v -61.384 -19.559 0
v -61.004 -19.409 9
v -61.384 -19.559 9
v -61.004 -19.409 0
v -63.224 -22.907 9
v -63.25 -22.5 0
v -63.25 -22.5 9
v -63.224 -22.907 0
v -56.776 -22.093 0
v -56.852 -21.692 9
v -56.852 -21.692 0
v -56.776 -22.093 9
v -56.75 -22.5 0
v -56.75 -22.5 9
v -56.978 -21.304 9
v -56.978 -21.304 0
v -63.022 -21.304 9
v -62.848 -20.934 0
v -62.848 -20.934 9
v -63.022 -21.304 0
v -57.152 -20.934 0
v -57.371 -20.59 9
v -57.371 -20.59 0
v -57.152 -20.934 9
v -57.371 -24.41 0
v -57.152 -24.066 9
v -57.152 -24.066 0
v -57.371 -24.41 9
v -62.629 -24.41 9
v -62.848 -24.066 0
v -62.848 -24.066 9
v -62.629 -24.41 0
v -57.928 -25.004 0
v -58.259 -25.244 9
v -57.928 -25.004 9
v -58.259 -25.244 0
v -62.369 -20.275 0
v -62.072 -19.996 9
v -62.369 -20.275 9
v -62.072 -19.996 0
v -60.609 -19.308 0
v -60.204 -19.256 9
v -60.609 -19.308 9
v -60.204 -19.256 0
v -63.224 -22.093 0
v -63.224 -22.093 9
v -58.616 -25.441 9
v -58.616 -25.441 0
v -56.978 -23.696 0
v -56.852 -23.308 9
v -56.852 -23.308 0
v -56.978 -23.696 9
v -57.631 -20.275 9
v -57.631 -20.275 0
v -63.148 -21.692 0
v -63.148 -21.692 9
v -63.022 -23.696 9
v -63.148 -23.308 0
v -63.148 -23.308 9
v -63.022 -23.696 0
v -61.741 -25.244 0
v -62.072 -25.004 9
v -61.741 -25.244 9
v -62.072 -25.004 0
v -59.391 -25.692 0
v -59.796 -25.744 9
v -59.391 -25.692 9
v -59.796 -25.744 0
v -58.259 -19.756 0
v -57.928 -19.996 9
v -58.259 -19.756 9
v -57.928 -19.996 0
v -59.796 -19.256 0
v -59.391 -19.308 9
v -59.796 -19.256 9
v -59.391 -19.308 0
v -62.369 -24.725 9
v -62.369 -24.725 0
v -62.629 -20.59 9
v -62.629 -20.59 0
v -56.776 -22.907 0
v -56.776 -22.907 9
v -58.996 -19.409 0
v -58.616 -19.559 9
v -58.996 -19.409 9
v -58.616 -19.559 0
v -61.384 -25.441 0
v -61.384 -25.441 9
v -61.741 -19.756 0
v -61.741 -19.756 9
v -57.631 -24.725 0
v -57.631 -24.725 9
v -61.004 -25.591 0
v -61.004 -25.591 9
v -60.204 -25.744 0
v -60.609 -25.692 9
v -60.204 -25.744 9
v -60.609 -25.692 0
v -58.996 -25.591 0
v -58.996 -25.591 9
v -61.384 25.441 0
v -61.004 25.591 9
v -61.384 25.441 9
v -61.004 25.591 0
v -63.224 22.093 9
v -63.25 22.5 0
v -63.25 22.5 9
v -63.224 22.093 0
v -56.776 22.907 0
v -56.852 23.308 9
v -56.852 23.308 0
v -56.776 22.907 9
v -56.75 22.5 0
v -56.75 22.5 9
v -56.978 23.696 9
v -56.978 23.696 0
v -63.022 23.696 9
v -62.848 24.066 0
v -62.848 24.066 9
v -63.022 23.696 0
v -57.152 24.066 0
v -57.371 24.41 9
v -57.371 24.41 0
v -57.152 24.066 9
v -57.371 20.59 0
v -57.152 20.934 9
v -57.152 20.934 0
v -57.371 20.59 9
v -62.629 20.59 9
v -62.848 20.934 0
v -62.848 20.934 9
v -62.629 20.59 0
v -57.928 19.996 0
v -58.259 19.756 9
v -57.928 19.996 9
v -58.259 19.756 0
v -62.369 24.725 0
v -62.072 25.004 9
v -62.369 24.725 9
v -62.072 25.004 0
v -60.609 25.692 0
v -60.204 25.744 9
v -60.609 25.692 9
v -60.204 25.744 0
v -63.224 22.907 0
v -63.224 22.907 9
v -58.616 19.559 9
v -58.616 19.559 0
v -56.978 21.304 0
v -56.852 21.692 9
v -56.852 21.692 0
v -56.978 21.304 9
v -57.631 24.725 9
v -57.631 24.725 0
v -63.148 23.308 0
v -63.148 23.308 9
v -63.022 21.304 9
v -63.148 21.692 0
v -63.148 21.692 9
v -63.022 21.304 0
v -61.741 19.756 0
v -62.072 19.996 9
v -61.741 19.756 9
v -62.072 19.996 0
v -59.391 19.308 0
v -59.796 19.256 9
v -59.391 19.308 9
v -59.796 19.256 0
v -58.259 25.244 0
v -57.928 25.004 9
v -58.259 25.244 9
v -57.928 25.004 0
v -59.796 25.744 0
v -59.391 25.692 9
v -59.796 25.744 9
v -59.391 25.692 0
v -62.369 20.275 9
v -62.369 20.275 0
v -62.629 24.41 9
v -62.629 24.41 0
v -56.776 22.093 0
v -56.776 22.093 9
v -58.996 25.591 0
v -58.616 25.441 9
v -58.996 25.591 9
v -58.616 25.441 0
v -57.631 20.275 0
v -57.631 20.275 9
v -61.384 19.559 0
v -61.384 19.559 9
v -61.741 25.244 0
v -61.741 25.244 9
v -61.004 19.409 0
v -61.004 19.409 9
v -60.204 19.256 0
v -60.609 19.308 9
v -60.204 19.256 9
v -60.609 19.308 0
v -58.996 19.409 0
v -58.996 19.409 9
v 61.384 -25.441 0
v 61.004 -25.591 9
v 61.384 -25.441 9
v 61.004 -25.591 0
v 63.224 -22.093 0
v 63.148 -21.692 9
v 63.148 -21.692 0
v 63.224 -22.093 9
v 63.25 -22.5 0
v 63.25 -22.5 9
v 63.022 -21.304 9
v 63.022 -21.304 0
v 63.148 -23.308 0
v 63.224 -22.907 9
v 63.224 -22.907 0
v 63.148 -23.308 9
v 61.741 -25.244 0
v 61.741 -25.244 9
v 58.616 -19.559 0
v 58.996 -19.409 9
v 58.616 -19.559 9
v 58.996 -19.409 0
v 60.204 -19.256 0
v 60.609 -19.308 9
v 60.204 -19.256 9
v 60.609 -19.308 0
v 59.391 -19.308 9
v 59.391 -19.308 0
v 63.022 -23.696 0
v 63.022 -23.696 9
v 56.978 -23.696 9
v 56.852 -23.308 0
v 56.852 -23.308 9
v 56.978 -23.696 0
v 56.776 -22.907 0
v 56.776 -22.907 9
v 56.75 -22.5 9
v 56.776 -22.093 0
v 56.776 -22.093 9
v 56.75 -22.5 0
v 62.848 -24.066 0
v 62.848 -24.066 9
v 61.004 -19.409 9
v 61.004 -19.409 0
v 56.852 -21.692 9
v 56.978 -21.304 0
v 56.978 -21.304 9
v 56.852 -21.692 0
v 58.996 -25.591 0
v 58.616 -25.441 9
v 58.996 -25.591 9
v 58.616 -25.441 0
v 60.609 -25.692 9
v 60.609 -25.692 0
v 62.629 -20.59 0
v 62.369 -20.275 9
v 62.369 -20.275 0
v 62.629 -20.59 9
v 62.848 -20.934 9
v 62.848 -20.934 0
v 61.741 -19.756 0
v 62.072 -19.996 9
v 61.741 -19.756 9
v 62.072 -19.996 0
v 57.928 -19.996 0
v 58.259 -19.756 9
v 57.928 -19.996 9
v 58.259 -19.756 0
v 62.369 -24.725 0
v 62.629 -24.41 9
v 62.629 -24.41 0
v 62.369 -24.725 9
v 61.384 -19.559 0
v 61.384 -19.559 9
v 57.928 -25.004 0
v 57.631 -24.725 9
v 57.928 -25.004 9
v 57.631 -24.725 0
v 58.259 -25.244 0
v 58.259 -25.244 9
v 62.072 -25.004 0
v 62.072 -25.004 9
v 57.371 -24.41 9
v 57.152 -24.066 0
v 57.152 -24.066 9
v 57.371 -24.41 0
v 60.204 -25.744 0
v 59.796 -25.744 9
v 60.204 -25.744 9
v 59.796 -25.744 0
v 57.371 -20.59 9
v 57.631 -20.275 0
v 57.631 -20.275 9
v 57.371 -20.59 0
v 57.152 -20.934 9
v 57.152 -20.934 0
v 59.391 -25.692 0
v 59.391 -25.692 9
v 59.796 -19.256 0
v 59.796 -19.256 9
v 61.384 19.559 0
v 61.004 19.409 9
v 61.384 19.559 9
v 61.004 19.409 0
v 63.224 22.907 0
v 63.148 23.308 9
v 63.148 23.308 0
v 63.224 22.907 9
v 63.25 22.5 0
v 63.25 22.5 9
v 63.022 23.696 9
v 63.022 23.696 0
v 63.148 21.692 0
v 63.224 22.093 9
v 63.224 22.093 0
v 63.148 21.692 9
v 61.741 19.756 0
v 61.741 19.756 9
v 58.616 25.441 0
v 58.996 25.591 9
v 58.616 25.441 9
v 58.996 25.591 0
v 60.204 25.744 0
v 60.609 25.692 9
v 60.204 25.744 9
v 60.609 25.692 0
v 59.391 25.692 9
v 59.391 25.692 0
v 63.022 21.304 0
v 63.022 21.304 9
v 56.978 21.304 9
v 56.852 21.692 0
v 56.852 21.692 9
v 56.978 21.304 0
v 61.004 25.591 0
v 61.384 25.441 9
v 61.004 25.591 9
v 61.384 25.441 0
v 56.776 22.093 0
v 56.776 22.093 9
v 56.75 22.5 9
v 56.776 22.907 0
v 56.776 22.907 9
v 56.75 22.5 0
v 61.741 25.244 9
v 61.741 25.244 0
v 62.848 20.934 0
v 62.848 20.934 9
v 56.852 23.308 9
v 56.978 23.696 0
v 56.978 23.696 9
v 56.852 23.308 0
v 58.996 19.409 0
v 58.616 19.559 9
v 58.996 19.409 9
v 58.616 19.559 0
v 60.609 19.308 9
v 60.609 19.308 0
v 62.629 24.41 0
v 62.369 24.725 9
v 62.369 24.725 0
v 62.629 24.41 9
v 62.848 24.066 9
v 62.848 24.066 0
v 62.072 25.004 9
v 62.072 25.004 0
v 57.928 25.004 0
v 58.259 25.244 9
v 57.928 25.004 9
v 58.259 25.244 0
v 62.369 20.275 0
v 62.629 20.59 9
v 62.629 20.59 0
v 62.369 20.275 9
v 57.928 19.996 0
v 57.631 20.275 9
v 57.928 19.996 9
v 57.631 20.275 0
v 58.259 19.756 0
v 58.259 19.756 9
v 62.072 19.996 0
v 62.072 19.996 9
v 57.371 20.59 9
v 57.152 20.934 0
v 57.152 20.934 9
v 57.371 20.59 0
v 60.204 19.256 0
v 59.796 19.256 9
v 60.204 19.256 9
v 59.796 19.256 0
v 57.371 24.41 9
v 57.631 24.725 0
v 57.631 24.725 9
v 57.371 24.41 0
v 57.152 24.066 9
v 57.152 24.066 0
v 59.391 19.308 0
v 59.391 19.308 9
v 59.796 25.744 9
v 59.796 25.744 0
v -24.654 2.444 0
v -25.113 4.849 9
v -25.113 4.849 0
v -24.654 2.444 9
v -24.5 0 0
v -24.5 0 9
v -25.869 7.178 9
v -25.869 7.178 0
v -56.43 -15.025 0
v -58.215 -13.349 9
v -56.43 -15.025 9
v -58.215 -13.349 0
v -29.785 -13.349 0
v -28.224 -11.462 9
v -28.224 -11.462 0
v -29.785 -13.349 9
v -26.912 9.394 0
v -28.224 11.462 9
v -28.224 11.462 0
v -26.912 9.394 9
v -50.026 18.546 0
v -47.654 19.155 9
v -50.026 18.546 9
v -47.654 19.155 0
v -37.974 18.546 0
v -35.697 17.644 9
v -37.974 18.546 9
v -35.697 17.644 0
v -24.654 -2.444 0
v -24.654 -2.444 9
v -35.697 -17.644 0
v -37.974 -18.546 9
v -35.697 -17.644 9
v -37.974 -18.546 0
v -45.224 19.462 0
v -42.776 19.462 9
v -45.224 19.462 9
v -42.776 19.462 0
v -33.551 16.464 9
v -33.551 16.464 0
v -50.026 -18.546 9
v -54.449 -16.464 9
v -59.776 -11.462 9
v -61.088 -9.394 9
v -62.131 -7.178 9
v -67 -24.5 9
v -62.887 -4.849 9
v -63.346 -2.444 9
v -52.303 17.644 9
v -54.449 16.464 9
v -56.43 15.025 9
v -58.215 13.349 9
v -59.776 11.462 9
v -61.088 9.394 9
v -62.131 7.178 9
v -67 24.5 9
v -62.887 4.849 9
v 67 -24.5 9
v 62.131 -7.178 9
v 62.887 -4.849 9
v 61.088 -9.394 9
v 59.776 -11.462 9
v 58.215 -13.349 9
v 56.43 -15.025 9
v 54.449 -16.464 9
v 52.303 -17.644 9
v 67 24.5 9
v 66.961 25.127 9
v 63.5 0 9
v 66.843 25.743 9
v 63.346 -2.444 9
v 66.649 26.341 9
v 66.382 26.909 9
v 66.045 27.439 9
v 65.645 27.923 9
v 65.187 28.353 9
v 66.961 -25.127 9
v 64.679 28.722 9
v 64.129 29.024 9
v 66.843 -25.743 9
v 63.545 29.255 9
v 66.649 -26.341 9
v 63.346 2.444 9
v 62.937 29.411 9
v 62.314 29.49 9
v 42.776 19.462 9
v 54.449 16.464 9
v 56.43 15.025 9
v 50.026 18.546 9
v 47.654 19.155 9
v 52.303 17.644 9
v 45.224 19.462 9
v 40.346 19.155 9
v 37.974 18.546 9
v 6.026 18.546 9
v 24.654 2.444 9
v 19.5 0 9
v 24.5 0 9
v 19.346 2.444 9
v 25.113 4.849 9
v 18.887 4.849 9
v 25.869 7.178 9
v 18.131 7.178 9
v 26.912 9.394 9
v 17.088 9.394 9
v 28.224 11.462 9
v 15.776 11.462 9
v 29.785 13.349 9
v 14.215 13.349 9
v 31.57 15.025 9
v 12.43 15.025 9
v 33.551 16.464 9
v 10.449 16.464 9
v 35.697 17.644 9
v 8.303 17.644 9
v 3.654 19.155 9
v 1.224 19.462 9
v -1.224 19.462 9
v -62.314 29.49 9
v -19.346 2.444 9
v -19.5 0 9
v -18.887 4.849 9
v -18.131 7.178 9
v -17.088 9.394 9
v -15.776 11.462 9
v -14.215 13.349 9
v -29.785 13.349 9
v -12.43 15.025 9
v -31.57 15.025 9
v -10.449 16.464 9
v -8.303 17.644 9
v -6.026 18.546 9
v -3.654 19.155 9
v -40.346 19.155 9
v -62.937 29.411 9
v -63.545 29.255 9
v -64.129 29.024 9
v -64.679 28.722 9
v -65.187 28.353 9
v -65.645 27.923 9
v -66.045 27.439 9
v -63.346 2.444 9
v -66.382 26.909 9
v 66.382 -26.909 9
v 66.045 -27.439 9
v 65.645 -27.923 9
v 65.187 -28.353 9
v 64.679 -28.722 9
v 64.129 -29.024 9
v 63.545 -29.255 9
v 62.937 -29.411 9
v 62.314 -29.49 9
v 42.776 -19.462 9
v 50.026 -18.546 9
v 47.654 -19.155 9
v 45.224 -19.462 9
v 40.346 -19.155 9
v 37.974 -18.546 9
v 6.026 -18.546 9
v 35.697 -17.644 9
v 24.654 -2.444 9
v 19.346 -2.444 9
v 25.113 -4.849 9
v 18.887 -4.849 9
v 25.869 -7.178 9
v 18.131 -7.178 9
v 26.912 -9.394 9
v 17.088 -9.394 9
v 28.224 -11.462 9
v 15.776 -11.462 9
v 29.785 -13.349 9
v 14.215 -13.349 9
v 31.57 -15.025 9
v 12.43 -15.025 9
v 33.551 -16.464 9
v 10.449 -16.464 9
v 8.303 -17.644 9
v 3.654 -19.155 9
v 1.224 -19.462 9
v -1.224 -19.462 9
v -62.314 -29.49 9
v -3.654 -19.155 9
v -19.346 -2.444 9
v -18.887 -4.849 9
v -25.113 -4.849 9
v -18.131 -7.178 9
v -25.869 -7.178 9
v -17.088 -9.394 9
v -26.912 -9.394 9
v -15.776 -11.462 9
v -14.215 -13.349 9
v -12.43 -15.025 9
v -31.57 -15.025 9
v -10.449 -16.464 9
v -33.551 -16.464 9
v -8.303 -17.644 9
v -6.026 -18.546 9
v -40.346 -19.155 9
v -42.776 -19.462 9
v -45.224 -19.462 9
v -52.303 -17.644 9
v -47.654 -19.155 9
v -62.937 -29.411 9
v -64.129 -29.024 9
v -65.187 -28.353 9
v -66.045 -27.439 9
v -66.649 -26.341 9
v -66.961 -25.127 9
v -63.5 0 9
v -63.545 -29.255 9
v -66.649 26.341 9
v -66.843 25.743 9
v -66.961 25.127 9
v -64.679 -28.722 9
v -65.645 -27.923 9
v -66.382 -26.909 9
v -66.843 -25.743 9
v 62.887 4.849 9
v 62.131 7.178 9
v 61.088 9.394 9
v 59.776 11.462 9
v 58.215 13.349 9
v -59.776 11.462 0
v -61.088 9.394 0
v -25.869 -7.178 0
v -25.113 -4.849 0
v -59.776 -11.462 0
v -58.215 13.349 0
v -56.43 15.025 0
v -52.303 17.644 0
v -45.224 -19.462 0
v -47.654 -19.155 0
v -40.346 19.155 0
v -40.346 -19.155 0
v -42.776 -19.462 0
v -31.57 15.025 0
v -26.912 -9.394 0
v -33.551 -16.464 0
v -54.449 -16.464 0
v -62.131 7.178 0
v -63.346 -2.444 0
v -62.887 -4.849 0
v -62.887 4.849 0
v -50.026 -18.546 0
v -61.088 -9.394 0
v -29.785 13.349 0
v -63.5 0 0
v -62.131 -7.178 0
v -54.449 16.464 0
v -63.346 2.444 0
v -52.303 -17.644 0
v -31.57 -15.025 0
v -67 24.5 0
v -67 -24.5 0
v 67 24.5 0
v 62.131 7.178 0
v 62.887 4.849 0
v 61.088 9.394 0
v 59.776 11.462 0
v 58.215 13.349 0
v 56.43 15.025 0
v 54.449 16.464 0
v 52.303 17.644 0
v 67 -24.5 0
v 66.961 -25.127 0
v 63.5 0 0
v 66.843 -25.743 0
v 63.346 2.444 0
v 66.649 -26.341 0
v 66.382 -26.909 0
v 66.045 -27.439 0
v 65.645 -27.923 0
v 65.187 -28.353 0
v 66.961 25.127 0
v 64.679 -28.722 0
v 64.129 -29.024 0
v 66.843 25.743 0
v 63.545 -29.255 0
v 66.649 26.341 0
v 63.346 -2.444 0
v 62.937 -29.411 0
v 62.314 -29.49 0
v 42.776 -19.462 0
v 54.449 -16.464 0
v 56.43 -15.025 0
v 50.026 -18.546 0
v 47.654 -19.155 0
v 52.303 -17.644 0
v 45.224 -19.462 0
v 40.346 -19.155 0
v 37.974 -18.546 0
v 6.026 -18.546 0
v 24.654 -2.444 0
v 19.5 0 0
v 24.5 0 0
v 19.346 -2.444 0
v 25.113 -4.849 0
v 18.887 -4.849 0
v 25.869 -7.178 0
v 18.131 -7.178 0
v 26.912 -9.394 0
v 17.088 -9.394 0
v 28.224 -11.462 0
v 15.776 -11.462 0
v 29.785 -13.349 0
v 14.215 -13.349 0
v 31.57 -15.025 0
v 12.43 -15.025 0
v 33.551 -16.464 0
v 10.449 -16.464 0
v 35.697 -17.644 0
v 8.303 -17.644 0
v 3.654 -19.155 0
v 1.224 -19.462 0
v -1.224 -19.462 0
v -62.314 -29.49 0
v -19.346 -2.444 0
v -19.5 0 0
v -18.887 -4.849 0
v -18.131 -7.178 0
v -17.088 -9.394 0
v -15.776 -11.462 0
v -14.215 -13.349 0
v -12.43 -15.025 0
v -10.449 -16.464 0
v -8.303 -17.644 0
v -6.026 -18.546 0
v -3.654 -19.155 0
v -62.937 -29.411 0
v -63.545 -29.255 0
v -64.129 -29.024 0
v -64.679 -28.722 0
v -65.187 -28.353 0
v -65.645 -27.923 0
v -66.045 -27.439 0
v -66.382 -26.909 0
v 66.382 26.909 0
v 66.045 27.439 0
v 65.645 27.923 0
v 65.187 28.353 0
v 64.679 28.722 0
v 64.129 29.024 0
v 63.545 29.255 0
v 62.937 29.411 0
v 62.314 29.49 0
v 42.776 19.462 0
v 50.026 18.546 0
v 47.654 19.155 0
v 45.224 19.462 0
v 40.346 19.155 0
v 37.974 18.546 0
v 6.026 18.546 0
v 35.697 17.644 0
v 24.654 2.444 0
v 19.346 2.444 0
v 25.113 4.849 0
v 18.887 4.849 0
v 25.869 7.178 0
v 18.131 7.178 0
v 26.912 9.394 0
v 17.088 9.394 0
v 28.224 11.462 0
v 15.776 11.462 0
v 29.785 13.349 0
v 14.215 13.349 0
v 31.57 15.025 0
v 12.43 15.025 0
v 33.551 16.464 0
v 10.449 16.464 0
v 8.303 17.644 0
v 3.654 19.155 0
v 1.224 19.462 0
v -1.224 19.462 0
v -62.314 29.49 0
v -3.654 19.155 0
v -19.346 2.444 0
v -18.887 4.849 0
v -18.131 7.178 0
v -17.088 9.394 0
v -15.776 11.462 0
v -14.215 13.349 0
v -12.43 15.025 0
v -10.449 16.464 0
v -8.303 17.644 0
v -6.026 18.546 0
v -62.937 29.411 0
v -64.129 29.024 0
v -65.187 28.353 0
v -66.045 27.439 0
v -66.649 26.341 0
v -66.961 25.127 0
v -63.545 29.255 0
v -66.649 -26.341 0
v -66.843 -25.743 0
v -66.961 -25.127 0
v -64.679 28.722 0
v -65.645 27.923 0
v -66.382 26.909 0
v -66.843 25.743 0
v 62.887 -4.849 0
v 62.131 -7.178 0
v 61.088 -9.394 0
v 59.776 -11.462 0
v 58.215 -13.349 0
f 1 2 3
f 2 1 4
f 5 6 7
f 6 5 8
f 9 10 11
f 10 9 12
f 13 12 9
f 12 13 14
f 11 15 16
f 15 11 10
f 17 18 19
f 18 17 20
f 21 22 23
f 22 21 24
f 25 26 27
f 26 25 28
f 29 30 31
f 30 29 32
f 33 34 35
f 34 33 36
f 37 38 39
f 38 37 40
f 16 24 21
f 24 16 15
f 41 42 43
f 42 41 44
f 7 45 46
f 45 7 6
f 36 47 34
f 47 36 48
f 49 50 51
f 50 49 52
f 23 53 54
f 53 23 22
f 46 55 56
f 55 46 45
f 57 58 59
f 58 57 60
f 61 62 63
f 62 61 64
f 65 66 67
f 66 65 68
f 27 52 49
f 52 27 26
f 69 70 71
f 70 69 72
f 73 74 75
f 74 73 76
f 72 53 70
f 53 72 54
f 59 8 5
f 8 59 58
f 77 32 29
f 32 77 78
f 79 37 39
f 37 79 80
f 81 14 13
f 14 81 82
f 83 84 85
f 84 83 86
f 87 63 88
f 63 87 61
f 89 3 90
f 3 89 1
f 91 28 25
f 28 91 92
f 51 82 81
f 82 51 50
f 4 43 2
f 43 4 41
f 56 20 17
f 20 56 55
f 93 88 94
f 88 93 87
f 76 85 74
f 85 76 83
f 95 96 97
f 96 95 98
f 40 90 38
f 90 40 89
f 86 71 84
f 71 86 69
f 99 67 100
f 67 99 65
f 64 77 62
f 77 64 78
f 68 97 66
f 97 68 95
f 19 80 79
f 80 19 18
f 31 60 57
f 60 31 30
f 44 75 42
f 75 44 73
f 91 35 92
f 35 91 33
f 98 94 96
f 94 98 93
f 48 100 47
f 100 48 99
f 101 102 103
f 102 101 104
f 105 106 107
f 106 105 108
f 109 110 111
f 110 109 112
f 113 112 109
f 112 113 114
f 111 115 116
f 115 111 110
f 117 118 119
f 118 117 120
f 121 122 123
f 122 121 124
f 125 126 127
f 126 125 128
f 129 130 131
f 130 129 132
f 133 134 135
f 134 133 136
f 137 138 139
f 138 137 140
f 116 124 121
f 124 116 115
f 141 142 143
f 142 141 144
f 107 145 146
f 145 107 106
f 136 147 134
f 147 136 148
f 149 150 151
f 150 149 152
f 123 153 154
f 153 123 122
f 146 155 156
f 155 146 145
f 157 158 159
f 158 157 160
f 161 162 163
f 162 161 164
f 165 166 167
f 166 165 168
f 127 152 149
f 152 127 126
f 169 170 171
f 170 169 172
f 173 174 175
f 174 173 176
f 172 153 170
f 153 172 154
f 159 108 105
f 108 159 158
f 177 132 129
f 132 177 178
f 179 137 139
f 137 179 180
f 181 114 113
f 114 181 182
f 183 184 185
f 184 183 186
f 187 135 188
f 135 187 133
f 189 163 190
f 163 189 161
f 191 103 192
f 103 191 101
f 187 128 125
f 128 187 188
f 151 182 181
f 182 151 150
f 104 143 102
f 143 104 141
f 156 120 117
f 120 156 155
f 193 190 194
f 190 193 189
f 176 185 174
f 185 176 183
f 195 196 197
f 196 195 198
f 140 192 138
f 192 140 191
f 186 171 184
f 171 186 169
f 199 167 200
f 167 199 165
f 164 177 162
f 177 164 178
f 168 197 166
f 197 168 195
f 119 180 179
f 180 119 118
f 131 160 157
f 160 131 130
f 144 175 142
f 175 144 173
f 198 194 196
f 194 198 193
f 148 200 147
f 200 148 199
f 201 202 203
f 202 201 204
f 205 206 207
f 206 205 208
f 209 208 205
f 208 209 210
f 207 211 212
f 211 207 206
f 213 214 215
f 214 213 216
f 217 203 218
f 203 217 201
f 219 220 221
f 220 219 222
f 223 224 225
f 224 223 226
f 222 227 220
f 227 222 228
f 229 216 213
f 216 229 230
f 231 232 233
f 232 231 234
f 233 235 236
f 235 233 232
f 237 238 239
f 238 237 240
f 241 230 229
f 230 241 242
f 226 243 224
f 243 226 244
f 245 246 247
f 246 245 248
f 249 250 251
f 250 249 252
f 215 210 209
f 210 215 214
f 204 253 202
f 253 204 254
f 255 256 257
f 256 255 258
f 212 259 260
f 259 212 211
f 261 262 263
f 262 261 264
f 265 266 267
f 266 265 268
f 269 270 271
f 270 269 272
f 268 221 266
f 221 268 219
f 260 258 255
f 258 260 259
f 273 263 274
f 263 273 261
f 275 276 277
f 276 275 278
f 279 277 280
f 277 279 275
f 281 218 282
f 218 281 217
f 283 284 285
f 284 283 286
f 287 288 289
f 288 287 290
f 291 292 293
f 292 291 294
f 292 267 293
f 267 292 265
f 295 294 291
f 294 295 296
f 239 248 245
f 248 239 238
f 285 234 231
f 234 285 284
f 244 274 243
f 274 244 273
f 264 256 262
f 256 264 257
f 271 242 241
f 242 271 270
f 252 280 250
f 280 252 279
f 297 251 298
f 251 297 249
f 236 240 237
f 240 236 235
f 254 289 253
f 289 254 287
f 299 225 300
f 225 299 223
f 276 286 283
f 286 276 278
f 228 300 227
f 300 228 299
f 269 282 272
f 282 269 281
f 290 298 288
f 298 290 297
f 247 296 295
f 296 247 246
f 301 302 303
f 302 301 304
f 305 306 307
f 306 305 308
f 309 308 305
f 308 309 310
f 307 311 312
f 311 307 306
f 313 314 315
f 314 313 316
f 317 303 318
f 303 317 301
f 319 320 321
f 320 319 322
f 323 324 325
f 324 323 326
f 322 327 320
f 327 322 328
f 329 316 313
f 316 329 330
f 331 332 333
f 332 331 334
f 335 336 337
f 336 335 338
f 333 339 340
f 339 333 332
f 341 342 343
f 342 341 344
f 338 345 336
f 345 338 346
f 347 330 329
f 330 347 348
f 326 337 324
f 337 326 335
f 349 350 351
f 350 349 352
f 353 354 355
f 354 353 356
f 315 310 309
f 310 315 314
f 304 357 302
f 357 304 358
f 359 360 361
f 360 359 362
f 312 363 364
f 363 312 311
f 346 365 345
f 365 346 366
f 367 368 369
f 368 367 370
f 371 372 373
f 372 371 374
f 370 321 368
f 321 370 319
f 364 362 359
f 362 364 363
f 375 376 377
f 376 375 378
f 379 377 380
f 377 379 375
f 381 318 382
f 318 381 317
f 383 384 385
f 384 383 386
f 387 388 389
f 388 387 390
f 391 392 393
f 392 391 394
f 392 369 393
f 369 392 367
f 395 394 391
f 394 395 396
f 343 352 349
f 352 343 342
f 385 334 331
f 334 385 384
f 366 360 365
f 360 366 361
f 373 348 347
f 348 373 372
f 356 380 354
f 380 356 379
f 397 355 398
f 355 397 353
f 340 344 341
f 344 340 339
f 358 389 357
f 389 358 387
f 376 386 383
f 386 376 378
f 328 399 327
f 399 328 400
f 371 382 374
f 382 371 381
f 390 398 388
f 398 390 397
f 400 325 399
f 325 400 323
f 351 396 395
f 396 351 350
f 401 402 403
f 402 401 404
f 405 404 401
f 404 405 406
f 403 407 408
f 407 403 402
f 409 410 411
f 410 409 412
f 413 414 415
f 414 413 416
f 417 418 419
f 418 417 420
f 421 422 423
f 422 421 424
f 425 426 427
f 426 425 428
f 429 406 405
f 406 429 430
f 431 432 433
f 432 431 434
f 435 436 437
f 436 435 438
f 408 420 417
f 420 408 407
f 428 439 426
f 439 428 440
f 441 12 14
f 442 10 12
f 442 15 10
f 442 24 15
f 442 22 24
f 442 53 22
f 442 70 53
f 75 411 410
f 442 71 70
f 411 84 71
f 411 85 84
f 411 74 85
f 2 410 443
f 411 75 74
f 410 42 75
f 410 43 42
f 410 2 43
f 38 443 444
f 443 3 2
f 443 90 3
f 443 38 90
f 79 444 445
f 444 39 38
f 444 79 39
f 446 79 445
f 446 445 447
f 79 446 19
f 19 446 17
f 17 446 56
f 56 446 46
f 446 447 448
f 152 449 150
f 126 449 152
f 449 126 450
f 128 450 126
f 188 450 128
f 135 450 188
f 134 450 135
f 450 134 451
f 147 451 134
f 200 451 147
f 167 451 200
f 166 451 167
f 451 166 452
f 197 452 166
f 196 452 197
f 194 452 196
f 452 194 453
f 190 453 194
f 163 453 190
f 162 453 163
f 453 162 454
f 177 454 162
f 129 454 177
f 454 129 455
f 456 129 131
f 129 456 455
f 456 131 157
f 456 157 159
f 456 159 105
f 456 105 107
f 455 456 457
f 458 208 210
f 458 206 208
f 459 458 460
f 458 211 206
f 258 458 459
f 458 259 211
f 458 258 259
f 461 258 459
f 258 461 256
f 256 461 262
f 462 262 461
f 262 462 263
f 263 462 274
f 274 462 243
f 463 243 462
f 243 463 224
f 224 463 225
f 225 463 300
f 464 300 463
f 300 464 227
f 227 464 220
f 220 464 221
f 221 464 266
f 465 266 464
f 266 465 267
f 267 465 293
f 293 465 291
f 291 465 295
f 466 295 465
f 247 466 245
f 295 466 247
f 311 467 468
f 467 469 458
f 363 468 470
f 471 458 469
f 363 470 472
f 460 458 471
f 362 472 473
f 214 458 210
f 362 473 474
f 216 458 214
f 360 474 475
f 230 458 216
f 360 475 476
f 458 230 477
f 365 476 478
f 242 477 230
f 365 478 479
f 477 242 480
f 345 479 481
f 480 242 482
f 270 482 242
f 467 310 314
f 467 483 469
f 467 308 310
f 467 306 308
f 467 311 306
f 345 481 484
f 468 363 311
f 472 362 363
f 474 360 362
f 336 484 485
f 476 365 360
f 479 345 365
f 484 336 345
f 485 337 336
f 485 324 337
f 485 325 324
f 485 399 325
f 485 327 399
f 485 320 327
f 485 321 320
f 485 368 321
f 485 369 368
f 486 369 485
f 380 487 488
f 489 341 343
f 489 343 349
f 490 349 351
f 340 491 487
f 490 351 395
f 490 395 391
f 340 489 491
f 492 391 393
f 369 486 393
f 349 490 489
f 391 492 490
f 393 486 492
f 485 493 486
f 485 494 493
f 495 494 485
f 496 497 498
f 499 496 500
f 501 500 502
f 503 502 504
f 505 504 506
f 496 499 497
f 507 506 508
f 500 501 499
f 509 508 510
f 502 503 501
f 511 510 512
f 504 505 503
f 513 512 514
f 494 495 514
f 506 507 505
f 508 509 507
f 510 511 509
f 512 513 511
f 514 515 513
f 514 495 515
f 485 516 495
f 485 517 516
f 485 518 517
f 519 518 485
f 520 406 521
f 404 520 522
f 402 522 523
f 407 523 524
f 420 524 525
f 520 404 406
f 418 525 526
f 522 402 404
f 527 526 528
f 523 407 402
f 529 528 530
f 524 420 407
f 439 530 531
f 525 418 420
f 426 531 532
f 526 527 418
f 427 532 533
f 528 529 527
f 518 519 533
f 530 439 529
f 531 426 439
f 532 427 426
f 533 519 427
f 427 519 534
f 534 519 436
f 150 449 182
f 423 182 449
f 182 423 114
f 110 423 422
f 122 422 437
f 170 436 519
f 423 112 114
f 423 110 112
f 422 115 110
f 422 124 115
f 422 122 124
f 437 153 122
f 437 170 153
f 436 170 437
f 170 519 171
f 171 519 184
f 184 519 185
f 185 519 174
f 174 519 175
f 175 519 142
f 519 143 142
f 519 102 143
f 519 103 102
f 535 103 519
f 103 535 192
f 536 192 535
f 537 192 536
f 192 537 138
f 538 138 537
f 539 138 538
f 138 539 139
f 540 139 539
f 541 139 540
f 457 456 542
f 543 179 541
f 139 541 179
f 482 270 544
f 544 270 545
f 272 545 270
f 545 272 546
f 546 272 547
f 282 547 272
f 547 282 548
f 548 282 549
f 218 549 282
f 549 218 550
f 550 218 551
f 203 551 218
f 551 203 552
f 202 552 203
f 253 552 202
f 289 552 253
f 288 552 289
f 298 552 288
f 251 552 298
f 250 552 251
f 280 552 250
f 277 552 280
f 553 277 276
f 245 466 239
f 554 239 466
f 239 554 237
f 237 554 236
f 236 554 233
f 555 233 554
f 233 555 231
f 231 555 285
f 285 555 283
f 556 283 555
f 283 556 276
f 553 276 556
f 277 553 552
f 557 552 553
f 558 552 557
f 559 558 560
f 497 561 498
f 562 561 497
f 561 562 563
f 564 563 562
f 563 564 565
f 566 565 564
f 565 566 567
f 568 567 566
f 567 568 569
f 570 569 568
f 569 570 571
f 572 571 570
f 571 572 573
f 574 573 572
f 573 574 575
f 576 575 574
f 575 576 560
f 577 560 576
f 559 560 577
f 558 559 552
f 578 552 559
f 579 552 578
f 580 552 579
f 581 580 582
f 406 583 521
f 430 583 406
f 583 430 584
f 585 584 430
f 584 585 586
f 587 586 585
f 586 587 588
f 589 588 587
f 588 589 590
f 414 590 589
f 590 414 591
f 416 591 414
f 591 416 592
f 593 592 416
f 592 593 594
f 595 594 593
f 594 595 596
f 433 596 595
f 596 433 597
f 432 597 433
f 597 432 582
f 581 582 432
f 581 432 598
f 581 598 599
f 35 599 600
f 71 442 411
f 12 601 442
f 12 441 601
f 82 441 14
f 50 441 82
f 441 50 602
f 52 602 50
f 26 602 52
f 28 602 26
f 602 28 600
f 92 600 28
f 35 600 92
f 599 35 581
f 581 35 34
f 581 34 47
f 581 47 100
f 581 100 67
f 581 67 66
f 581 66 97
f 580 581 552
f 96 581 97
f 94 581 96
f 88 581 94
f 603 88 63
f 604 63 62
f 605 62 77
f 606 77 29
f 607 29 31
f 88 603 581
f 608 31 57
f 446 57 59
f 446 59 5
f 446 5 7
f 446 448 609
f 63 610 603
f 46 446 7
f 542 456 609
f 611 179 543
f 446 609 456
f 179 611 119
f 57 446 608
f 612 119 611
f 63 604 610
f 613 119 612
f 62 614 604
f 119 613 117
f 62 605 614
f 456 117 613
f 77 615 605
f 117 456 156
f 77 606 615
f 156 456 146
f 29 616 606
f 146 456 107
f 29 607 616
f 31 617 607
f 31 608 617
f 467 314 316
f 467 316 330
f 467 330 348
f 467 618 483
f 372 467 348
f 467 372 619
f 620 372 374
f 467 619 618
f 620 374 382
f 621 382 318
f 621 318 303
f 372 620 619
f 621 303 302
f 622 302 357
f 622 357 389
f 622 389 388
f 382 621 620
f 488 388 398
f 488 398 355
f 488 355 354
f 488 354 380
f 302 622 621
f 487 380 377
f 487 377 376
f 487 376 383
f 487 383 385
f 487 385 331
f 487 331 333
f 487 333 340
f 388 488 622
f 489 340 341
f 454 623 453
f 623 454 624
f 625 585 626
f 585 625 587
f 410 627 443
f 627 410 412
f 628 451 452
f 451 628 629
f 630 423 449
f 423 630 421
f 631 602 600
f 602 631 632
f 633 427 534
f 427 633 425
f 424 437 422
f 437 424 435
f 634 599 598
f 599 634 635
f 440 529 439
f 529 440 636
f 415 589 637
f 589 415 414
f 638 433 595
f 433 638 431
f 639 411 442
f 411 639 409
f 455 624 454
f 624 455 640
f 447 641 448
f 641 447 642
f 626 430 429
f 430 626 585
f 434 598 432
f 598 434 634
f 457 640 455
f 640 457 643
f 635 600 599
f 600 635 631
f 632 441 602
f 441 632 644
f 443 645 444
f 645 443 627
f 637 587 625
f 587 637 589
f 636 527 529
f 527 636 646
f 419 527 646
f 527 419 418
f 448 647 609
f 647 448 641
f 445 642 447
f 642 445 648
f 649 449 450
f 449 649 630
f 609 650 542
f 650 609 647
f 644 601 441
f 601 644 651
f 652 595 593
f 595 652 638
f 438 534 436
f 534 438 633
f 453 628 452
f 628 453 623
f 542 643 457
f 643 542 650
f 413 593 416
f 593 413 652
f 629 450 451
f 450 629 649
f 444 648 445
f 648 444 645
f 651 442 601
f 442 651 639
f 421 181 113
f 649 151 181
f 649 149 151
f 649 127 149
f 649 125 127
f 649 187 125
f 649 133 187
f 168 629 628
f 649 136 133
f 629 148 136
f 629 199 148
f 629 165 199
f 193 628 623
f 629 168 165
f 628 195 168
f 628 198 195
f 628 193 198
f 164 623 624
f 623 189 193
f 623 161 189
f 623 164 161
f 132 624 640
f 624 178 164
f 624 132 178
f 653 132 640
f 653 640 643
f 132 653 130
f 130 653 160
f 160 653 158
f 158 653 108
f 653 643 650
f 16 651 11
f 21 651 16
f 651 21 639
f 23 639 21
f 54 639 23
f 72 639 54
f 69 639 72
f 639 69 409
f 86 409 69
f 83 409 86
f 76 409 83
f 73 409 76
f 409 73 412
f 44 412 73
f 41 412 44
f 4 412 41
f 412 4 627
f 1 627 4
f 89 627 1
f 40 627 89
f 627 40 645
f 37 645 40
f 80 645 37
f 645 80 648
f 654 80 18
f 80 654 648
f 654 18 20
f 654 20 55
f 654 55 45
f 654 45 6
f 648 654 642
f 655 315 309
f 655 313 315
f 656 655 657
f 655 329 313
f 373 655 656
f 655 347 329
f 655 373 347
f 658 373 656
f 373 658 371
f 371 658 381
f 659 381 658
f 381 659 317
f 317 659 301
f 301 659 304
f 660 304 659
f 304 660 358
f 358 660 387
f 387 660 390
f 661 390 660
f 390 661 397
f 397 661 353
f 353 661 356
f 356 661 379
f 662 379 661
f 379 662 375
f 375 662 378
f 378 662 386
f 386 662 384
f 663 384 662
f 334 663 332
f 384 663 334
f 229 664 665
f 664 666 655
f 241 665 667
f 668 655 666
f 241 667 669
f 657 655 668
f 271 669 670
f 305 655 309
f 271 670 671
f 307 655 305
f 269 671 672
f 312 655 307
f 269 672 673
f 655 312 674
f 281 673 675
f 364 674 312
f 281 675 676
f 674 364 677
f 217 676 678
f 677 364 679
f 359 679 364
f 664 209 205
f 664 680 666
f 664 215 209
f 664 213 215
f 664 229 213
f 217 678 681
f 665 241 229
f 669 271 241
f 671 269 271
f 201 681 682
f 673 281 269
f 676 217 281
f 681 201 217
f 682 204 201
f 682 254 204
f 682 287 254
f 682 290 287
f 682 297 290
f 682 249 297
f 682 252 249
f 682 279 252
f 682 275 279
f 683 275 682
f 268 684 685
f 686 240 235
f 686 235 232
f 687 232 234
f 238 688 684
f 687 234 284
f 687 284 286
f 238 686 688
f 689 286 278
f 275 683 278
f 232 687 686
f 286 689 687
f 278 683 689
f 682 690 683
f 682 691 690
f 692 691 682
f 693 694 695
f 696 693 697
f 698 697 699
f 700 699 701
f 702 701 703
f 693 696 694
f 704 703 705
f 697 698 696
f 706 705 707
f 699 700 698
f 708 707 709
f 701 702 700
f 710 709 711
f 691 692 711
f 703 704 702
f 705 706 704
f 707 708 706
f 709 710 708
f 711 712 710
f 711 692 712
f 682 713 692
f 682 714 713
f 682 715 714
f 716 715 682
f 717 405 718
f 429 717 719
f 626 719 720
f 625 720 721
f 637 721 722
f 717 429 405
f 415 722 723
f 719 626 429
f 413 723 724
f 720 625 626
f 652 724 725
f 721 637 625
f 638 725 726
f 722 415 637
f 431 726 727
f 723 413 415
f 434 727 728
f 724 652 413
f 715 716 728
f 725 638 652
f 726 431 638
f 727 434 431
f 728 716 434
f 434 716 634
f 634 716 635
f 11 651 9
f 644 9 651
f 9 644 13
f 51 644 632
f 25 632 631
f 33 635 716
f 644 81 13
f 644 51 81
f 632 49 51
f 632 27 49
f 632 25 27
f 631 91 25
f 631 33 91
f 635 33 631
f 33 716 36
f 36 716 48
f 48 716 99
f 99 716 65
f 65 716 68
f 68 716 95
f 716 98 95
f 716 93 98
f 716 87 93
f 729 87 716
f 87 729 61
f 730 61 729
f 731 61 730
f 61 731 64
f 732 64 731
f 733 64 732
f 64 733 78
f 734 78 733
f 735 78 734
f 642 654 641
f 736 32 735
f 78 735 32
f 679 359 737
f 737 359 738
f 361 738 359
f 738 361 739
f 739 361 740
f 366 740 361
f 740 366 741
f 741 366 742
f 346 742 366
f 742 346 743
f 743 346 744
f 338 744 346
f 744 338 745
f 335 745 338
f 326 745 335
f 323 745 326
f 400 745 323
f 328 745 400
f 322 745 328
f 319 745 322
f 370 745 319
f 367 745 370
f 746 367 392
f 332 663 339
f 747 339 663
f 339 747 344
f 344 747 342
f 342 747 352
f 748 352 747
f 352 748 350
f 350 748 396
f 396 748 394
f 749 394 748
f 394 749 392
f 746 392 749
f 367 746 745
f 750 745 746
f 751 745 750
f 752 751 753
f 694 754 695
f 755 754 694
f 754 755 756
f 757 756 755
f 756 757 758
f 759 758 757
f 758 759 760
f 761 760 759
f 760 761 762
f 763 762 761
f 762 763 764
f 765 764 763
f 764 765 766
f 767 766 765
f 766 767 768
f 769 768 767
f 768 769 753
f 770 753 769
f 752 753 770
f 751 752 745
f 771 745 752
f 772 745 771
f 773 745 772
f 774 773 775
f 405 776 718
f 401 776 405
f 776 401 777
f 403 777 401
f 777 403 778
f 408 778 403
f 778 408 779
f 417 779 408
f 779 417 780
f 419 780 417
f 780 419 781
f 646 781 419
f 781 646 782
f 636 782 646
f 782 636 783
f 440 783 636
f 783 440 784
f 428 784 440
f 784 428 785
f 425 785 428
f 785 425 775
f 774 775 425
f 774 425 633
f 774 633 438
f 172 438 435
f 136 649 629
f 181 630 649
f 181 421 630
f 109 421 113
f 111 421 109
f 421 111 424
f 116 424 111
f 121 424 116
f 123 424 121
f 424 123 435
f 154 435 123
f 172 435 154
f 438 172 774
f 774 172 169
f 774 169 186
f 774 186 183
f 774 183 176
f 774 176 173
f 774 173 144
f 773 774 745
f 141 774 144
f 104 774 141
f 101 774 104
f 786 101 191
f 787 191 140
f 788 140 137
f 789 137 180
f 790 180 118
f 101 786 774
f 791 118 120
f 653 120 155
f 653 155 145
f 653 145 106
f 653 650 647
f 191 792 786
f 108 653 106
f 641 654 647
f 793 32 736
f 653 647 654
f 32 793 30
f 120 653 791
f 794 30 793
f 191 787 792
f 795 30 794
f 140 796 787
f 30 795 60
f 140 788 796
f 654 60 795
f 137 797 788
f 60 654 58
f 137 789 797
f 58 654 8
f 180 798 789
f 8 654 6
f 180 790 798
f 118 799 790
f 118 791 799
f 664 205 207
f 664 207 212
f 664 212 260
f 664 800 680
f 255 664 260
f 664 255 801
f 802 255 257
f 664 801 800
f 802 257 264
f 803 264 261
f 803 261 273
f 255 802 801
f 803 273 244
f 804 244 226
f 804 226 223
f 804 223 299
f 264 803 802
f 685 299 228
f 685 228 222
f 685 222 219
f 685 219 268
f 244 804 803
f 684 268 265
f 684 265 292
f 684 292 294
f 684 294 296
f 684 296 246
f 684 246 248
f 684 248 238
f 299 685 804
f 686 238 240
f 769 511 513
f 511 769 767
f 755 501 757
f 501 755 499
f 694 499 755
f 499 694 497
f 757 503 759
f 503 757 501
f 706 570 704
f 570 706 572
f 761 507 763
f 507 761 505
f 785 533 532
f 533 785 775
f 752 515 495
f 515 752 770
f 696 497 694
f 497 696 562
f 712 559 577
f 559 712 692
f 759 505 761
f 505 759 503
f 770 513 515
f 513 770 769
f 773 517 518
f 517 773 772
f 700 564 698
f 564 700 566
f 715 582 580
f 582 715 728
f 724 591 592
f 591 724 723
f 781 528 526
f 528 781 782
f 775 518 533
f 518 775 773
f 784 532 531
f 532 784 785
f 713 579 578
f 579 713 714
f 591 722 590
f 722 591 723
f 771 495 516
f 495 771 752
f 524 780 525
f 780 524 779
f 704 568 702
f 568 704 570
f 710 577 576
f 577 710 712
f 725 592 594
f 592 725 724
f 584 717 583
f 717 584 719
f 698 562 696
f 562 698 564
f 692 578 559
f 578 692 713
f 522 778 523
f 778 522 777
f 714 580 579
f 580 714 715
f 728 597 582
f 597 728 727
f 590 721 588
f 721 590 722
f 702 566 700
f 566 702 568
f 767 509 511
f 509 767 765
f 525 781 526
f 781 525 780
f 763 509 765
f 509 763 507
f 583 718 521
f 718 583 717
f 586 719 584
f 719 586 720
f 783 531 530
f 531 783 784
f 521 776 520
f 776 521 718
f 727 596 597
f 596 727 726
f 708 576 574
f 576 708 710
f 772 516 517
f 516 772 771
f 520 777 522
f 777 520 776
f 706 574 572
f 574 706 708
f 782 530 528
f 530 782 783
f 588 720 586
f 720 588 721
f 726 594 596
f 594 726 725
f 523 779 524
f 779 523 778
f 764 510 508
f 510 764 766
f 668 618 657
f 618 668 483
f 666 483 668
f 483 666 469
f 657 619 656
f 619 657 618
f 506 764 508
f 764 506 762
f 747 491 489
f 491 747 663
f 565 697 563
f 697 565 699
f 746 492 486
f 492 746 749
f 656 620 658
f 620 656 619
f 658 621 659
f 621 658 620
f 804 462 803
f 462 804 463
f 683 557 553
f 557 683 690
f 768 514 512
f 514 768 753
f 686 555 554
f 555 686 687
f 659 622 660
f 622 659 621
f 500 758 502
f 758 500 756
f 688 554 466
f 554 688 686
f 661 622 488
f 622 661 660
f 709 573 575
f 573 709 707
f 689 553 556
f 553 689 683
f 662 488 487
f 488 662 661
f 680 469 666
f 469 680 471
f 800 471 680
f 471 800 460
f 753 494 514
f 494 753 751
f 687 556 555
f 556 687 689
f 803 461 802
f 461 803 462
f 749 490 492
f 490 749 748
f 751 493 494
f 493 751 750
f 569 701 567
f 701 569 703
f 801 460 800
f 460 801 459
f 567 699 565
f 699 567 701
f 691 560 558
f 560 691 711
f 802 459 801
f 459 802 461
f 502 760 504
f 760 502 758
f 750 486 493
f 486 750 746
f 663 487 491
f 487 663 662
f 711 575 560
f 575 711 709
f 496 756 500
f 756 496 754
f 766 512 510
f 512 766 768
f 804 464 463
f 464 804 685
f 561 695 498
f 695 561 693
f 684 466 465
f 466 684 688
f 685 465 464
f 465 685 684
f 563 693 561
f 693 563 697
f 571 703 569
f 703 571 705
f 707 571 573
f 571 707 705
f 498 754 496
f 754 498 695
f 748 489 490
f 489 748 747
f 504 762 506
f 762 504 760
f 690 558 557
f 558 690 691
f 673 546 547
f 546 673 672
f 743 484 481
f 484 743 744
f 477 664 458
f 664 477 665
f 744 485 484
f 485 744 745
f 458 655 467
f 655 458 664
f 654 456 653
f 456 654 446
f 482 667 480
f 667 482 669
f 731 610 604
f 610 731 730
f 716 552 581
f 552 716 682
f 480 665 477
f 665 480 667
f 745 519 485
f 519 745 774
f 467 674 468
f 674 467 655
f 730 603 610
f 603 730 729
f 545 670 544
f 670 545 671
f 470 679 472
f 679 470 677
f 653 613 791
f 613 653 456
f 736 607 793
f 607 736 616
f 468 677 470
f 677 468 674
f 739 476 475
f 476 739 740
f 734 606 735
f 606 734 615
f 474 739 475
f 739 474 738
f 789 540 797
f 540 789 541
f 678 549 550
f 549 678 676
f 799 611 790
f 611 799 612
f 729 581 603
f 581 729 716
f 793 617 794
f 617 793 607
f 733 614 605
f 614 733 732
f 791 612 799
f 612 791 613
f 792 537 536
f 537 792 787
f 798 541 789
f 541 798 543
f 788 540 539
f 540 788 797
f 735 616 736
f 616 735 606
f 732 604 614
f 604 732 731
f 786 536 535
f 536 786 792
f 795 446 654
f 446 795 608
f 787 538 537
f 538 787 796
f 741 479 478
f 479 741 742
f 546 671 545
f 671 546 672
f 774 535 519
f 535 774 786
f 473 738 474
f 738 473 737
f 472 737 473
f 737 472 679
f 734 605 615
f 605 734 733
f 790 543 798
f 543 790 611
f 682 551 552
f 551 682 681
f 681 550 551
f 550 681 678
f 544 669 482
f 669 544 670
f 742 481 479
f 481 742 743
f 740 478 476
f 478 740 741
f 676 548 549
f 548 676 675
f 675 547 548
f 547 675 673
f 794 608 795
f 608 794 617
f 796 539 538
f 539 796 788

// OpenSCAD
$fn = 50;


difference() {
	union() {
		hull() {
			translate(v = [-62.0000000000, 24.5000000000, 0]) {
				cylinder(h = 9, r = 5);
			}
			translate(v = [62.0000000000, 24.5000000000, 0]) {
				cylinder(h = 9, r = 5);
			}
			translate(v = [-62.0000000000, -24.5000000000, 0]) {
				cylinder(h = 9, r = 5);
			}
			translate(v = [62.0000000000, -24.5000000000, 0]) {
				cylinder(h = 9, r = 5);
			}
		}
	}
	union() {
		#translate(v = [-60.0000000000, -22.5000000000, -100.0000000000]) {
			cylinder(h = 200, r = 3.2500000000);
		}
		#translate(v = [-60.0000000000, 22.5000000000, -100.0000000000]) {
			cylinder(h = 200, r = 3.2500000000);
		}
		#translate(v = [60.0000000000, -22.5000000000, -100.0000000000]) {
			cylinder(h = 200, r = 3.2500000000);
		}
		#translate(v = [60.0000000000, 22.5000000000, -100.0000000000]) {
			cylinder(h = 200, r = 3.2500000000);
		}
		#translate(v = [-44.0000000000, 0, 0]) {
			cylinder(h = 9, r = 19.5000000000);
		}
		#cylinder(h = 9, r = 19.5000000000);
		#translate(v = [44.0000000000, 0, 0]) {
			cylinder(h = 9, r = 19.5000000000);
		}
	}
}
